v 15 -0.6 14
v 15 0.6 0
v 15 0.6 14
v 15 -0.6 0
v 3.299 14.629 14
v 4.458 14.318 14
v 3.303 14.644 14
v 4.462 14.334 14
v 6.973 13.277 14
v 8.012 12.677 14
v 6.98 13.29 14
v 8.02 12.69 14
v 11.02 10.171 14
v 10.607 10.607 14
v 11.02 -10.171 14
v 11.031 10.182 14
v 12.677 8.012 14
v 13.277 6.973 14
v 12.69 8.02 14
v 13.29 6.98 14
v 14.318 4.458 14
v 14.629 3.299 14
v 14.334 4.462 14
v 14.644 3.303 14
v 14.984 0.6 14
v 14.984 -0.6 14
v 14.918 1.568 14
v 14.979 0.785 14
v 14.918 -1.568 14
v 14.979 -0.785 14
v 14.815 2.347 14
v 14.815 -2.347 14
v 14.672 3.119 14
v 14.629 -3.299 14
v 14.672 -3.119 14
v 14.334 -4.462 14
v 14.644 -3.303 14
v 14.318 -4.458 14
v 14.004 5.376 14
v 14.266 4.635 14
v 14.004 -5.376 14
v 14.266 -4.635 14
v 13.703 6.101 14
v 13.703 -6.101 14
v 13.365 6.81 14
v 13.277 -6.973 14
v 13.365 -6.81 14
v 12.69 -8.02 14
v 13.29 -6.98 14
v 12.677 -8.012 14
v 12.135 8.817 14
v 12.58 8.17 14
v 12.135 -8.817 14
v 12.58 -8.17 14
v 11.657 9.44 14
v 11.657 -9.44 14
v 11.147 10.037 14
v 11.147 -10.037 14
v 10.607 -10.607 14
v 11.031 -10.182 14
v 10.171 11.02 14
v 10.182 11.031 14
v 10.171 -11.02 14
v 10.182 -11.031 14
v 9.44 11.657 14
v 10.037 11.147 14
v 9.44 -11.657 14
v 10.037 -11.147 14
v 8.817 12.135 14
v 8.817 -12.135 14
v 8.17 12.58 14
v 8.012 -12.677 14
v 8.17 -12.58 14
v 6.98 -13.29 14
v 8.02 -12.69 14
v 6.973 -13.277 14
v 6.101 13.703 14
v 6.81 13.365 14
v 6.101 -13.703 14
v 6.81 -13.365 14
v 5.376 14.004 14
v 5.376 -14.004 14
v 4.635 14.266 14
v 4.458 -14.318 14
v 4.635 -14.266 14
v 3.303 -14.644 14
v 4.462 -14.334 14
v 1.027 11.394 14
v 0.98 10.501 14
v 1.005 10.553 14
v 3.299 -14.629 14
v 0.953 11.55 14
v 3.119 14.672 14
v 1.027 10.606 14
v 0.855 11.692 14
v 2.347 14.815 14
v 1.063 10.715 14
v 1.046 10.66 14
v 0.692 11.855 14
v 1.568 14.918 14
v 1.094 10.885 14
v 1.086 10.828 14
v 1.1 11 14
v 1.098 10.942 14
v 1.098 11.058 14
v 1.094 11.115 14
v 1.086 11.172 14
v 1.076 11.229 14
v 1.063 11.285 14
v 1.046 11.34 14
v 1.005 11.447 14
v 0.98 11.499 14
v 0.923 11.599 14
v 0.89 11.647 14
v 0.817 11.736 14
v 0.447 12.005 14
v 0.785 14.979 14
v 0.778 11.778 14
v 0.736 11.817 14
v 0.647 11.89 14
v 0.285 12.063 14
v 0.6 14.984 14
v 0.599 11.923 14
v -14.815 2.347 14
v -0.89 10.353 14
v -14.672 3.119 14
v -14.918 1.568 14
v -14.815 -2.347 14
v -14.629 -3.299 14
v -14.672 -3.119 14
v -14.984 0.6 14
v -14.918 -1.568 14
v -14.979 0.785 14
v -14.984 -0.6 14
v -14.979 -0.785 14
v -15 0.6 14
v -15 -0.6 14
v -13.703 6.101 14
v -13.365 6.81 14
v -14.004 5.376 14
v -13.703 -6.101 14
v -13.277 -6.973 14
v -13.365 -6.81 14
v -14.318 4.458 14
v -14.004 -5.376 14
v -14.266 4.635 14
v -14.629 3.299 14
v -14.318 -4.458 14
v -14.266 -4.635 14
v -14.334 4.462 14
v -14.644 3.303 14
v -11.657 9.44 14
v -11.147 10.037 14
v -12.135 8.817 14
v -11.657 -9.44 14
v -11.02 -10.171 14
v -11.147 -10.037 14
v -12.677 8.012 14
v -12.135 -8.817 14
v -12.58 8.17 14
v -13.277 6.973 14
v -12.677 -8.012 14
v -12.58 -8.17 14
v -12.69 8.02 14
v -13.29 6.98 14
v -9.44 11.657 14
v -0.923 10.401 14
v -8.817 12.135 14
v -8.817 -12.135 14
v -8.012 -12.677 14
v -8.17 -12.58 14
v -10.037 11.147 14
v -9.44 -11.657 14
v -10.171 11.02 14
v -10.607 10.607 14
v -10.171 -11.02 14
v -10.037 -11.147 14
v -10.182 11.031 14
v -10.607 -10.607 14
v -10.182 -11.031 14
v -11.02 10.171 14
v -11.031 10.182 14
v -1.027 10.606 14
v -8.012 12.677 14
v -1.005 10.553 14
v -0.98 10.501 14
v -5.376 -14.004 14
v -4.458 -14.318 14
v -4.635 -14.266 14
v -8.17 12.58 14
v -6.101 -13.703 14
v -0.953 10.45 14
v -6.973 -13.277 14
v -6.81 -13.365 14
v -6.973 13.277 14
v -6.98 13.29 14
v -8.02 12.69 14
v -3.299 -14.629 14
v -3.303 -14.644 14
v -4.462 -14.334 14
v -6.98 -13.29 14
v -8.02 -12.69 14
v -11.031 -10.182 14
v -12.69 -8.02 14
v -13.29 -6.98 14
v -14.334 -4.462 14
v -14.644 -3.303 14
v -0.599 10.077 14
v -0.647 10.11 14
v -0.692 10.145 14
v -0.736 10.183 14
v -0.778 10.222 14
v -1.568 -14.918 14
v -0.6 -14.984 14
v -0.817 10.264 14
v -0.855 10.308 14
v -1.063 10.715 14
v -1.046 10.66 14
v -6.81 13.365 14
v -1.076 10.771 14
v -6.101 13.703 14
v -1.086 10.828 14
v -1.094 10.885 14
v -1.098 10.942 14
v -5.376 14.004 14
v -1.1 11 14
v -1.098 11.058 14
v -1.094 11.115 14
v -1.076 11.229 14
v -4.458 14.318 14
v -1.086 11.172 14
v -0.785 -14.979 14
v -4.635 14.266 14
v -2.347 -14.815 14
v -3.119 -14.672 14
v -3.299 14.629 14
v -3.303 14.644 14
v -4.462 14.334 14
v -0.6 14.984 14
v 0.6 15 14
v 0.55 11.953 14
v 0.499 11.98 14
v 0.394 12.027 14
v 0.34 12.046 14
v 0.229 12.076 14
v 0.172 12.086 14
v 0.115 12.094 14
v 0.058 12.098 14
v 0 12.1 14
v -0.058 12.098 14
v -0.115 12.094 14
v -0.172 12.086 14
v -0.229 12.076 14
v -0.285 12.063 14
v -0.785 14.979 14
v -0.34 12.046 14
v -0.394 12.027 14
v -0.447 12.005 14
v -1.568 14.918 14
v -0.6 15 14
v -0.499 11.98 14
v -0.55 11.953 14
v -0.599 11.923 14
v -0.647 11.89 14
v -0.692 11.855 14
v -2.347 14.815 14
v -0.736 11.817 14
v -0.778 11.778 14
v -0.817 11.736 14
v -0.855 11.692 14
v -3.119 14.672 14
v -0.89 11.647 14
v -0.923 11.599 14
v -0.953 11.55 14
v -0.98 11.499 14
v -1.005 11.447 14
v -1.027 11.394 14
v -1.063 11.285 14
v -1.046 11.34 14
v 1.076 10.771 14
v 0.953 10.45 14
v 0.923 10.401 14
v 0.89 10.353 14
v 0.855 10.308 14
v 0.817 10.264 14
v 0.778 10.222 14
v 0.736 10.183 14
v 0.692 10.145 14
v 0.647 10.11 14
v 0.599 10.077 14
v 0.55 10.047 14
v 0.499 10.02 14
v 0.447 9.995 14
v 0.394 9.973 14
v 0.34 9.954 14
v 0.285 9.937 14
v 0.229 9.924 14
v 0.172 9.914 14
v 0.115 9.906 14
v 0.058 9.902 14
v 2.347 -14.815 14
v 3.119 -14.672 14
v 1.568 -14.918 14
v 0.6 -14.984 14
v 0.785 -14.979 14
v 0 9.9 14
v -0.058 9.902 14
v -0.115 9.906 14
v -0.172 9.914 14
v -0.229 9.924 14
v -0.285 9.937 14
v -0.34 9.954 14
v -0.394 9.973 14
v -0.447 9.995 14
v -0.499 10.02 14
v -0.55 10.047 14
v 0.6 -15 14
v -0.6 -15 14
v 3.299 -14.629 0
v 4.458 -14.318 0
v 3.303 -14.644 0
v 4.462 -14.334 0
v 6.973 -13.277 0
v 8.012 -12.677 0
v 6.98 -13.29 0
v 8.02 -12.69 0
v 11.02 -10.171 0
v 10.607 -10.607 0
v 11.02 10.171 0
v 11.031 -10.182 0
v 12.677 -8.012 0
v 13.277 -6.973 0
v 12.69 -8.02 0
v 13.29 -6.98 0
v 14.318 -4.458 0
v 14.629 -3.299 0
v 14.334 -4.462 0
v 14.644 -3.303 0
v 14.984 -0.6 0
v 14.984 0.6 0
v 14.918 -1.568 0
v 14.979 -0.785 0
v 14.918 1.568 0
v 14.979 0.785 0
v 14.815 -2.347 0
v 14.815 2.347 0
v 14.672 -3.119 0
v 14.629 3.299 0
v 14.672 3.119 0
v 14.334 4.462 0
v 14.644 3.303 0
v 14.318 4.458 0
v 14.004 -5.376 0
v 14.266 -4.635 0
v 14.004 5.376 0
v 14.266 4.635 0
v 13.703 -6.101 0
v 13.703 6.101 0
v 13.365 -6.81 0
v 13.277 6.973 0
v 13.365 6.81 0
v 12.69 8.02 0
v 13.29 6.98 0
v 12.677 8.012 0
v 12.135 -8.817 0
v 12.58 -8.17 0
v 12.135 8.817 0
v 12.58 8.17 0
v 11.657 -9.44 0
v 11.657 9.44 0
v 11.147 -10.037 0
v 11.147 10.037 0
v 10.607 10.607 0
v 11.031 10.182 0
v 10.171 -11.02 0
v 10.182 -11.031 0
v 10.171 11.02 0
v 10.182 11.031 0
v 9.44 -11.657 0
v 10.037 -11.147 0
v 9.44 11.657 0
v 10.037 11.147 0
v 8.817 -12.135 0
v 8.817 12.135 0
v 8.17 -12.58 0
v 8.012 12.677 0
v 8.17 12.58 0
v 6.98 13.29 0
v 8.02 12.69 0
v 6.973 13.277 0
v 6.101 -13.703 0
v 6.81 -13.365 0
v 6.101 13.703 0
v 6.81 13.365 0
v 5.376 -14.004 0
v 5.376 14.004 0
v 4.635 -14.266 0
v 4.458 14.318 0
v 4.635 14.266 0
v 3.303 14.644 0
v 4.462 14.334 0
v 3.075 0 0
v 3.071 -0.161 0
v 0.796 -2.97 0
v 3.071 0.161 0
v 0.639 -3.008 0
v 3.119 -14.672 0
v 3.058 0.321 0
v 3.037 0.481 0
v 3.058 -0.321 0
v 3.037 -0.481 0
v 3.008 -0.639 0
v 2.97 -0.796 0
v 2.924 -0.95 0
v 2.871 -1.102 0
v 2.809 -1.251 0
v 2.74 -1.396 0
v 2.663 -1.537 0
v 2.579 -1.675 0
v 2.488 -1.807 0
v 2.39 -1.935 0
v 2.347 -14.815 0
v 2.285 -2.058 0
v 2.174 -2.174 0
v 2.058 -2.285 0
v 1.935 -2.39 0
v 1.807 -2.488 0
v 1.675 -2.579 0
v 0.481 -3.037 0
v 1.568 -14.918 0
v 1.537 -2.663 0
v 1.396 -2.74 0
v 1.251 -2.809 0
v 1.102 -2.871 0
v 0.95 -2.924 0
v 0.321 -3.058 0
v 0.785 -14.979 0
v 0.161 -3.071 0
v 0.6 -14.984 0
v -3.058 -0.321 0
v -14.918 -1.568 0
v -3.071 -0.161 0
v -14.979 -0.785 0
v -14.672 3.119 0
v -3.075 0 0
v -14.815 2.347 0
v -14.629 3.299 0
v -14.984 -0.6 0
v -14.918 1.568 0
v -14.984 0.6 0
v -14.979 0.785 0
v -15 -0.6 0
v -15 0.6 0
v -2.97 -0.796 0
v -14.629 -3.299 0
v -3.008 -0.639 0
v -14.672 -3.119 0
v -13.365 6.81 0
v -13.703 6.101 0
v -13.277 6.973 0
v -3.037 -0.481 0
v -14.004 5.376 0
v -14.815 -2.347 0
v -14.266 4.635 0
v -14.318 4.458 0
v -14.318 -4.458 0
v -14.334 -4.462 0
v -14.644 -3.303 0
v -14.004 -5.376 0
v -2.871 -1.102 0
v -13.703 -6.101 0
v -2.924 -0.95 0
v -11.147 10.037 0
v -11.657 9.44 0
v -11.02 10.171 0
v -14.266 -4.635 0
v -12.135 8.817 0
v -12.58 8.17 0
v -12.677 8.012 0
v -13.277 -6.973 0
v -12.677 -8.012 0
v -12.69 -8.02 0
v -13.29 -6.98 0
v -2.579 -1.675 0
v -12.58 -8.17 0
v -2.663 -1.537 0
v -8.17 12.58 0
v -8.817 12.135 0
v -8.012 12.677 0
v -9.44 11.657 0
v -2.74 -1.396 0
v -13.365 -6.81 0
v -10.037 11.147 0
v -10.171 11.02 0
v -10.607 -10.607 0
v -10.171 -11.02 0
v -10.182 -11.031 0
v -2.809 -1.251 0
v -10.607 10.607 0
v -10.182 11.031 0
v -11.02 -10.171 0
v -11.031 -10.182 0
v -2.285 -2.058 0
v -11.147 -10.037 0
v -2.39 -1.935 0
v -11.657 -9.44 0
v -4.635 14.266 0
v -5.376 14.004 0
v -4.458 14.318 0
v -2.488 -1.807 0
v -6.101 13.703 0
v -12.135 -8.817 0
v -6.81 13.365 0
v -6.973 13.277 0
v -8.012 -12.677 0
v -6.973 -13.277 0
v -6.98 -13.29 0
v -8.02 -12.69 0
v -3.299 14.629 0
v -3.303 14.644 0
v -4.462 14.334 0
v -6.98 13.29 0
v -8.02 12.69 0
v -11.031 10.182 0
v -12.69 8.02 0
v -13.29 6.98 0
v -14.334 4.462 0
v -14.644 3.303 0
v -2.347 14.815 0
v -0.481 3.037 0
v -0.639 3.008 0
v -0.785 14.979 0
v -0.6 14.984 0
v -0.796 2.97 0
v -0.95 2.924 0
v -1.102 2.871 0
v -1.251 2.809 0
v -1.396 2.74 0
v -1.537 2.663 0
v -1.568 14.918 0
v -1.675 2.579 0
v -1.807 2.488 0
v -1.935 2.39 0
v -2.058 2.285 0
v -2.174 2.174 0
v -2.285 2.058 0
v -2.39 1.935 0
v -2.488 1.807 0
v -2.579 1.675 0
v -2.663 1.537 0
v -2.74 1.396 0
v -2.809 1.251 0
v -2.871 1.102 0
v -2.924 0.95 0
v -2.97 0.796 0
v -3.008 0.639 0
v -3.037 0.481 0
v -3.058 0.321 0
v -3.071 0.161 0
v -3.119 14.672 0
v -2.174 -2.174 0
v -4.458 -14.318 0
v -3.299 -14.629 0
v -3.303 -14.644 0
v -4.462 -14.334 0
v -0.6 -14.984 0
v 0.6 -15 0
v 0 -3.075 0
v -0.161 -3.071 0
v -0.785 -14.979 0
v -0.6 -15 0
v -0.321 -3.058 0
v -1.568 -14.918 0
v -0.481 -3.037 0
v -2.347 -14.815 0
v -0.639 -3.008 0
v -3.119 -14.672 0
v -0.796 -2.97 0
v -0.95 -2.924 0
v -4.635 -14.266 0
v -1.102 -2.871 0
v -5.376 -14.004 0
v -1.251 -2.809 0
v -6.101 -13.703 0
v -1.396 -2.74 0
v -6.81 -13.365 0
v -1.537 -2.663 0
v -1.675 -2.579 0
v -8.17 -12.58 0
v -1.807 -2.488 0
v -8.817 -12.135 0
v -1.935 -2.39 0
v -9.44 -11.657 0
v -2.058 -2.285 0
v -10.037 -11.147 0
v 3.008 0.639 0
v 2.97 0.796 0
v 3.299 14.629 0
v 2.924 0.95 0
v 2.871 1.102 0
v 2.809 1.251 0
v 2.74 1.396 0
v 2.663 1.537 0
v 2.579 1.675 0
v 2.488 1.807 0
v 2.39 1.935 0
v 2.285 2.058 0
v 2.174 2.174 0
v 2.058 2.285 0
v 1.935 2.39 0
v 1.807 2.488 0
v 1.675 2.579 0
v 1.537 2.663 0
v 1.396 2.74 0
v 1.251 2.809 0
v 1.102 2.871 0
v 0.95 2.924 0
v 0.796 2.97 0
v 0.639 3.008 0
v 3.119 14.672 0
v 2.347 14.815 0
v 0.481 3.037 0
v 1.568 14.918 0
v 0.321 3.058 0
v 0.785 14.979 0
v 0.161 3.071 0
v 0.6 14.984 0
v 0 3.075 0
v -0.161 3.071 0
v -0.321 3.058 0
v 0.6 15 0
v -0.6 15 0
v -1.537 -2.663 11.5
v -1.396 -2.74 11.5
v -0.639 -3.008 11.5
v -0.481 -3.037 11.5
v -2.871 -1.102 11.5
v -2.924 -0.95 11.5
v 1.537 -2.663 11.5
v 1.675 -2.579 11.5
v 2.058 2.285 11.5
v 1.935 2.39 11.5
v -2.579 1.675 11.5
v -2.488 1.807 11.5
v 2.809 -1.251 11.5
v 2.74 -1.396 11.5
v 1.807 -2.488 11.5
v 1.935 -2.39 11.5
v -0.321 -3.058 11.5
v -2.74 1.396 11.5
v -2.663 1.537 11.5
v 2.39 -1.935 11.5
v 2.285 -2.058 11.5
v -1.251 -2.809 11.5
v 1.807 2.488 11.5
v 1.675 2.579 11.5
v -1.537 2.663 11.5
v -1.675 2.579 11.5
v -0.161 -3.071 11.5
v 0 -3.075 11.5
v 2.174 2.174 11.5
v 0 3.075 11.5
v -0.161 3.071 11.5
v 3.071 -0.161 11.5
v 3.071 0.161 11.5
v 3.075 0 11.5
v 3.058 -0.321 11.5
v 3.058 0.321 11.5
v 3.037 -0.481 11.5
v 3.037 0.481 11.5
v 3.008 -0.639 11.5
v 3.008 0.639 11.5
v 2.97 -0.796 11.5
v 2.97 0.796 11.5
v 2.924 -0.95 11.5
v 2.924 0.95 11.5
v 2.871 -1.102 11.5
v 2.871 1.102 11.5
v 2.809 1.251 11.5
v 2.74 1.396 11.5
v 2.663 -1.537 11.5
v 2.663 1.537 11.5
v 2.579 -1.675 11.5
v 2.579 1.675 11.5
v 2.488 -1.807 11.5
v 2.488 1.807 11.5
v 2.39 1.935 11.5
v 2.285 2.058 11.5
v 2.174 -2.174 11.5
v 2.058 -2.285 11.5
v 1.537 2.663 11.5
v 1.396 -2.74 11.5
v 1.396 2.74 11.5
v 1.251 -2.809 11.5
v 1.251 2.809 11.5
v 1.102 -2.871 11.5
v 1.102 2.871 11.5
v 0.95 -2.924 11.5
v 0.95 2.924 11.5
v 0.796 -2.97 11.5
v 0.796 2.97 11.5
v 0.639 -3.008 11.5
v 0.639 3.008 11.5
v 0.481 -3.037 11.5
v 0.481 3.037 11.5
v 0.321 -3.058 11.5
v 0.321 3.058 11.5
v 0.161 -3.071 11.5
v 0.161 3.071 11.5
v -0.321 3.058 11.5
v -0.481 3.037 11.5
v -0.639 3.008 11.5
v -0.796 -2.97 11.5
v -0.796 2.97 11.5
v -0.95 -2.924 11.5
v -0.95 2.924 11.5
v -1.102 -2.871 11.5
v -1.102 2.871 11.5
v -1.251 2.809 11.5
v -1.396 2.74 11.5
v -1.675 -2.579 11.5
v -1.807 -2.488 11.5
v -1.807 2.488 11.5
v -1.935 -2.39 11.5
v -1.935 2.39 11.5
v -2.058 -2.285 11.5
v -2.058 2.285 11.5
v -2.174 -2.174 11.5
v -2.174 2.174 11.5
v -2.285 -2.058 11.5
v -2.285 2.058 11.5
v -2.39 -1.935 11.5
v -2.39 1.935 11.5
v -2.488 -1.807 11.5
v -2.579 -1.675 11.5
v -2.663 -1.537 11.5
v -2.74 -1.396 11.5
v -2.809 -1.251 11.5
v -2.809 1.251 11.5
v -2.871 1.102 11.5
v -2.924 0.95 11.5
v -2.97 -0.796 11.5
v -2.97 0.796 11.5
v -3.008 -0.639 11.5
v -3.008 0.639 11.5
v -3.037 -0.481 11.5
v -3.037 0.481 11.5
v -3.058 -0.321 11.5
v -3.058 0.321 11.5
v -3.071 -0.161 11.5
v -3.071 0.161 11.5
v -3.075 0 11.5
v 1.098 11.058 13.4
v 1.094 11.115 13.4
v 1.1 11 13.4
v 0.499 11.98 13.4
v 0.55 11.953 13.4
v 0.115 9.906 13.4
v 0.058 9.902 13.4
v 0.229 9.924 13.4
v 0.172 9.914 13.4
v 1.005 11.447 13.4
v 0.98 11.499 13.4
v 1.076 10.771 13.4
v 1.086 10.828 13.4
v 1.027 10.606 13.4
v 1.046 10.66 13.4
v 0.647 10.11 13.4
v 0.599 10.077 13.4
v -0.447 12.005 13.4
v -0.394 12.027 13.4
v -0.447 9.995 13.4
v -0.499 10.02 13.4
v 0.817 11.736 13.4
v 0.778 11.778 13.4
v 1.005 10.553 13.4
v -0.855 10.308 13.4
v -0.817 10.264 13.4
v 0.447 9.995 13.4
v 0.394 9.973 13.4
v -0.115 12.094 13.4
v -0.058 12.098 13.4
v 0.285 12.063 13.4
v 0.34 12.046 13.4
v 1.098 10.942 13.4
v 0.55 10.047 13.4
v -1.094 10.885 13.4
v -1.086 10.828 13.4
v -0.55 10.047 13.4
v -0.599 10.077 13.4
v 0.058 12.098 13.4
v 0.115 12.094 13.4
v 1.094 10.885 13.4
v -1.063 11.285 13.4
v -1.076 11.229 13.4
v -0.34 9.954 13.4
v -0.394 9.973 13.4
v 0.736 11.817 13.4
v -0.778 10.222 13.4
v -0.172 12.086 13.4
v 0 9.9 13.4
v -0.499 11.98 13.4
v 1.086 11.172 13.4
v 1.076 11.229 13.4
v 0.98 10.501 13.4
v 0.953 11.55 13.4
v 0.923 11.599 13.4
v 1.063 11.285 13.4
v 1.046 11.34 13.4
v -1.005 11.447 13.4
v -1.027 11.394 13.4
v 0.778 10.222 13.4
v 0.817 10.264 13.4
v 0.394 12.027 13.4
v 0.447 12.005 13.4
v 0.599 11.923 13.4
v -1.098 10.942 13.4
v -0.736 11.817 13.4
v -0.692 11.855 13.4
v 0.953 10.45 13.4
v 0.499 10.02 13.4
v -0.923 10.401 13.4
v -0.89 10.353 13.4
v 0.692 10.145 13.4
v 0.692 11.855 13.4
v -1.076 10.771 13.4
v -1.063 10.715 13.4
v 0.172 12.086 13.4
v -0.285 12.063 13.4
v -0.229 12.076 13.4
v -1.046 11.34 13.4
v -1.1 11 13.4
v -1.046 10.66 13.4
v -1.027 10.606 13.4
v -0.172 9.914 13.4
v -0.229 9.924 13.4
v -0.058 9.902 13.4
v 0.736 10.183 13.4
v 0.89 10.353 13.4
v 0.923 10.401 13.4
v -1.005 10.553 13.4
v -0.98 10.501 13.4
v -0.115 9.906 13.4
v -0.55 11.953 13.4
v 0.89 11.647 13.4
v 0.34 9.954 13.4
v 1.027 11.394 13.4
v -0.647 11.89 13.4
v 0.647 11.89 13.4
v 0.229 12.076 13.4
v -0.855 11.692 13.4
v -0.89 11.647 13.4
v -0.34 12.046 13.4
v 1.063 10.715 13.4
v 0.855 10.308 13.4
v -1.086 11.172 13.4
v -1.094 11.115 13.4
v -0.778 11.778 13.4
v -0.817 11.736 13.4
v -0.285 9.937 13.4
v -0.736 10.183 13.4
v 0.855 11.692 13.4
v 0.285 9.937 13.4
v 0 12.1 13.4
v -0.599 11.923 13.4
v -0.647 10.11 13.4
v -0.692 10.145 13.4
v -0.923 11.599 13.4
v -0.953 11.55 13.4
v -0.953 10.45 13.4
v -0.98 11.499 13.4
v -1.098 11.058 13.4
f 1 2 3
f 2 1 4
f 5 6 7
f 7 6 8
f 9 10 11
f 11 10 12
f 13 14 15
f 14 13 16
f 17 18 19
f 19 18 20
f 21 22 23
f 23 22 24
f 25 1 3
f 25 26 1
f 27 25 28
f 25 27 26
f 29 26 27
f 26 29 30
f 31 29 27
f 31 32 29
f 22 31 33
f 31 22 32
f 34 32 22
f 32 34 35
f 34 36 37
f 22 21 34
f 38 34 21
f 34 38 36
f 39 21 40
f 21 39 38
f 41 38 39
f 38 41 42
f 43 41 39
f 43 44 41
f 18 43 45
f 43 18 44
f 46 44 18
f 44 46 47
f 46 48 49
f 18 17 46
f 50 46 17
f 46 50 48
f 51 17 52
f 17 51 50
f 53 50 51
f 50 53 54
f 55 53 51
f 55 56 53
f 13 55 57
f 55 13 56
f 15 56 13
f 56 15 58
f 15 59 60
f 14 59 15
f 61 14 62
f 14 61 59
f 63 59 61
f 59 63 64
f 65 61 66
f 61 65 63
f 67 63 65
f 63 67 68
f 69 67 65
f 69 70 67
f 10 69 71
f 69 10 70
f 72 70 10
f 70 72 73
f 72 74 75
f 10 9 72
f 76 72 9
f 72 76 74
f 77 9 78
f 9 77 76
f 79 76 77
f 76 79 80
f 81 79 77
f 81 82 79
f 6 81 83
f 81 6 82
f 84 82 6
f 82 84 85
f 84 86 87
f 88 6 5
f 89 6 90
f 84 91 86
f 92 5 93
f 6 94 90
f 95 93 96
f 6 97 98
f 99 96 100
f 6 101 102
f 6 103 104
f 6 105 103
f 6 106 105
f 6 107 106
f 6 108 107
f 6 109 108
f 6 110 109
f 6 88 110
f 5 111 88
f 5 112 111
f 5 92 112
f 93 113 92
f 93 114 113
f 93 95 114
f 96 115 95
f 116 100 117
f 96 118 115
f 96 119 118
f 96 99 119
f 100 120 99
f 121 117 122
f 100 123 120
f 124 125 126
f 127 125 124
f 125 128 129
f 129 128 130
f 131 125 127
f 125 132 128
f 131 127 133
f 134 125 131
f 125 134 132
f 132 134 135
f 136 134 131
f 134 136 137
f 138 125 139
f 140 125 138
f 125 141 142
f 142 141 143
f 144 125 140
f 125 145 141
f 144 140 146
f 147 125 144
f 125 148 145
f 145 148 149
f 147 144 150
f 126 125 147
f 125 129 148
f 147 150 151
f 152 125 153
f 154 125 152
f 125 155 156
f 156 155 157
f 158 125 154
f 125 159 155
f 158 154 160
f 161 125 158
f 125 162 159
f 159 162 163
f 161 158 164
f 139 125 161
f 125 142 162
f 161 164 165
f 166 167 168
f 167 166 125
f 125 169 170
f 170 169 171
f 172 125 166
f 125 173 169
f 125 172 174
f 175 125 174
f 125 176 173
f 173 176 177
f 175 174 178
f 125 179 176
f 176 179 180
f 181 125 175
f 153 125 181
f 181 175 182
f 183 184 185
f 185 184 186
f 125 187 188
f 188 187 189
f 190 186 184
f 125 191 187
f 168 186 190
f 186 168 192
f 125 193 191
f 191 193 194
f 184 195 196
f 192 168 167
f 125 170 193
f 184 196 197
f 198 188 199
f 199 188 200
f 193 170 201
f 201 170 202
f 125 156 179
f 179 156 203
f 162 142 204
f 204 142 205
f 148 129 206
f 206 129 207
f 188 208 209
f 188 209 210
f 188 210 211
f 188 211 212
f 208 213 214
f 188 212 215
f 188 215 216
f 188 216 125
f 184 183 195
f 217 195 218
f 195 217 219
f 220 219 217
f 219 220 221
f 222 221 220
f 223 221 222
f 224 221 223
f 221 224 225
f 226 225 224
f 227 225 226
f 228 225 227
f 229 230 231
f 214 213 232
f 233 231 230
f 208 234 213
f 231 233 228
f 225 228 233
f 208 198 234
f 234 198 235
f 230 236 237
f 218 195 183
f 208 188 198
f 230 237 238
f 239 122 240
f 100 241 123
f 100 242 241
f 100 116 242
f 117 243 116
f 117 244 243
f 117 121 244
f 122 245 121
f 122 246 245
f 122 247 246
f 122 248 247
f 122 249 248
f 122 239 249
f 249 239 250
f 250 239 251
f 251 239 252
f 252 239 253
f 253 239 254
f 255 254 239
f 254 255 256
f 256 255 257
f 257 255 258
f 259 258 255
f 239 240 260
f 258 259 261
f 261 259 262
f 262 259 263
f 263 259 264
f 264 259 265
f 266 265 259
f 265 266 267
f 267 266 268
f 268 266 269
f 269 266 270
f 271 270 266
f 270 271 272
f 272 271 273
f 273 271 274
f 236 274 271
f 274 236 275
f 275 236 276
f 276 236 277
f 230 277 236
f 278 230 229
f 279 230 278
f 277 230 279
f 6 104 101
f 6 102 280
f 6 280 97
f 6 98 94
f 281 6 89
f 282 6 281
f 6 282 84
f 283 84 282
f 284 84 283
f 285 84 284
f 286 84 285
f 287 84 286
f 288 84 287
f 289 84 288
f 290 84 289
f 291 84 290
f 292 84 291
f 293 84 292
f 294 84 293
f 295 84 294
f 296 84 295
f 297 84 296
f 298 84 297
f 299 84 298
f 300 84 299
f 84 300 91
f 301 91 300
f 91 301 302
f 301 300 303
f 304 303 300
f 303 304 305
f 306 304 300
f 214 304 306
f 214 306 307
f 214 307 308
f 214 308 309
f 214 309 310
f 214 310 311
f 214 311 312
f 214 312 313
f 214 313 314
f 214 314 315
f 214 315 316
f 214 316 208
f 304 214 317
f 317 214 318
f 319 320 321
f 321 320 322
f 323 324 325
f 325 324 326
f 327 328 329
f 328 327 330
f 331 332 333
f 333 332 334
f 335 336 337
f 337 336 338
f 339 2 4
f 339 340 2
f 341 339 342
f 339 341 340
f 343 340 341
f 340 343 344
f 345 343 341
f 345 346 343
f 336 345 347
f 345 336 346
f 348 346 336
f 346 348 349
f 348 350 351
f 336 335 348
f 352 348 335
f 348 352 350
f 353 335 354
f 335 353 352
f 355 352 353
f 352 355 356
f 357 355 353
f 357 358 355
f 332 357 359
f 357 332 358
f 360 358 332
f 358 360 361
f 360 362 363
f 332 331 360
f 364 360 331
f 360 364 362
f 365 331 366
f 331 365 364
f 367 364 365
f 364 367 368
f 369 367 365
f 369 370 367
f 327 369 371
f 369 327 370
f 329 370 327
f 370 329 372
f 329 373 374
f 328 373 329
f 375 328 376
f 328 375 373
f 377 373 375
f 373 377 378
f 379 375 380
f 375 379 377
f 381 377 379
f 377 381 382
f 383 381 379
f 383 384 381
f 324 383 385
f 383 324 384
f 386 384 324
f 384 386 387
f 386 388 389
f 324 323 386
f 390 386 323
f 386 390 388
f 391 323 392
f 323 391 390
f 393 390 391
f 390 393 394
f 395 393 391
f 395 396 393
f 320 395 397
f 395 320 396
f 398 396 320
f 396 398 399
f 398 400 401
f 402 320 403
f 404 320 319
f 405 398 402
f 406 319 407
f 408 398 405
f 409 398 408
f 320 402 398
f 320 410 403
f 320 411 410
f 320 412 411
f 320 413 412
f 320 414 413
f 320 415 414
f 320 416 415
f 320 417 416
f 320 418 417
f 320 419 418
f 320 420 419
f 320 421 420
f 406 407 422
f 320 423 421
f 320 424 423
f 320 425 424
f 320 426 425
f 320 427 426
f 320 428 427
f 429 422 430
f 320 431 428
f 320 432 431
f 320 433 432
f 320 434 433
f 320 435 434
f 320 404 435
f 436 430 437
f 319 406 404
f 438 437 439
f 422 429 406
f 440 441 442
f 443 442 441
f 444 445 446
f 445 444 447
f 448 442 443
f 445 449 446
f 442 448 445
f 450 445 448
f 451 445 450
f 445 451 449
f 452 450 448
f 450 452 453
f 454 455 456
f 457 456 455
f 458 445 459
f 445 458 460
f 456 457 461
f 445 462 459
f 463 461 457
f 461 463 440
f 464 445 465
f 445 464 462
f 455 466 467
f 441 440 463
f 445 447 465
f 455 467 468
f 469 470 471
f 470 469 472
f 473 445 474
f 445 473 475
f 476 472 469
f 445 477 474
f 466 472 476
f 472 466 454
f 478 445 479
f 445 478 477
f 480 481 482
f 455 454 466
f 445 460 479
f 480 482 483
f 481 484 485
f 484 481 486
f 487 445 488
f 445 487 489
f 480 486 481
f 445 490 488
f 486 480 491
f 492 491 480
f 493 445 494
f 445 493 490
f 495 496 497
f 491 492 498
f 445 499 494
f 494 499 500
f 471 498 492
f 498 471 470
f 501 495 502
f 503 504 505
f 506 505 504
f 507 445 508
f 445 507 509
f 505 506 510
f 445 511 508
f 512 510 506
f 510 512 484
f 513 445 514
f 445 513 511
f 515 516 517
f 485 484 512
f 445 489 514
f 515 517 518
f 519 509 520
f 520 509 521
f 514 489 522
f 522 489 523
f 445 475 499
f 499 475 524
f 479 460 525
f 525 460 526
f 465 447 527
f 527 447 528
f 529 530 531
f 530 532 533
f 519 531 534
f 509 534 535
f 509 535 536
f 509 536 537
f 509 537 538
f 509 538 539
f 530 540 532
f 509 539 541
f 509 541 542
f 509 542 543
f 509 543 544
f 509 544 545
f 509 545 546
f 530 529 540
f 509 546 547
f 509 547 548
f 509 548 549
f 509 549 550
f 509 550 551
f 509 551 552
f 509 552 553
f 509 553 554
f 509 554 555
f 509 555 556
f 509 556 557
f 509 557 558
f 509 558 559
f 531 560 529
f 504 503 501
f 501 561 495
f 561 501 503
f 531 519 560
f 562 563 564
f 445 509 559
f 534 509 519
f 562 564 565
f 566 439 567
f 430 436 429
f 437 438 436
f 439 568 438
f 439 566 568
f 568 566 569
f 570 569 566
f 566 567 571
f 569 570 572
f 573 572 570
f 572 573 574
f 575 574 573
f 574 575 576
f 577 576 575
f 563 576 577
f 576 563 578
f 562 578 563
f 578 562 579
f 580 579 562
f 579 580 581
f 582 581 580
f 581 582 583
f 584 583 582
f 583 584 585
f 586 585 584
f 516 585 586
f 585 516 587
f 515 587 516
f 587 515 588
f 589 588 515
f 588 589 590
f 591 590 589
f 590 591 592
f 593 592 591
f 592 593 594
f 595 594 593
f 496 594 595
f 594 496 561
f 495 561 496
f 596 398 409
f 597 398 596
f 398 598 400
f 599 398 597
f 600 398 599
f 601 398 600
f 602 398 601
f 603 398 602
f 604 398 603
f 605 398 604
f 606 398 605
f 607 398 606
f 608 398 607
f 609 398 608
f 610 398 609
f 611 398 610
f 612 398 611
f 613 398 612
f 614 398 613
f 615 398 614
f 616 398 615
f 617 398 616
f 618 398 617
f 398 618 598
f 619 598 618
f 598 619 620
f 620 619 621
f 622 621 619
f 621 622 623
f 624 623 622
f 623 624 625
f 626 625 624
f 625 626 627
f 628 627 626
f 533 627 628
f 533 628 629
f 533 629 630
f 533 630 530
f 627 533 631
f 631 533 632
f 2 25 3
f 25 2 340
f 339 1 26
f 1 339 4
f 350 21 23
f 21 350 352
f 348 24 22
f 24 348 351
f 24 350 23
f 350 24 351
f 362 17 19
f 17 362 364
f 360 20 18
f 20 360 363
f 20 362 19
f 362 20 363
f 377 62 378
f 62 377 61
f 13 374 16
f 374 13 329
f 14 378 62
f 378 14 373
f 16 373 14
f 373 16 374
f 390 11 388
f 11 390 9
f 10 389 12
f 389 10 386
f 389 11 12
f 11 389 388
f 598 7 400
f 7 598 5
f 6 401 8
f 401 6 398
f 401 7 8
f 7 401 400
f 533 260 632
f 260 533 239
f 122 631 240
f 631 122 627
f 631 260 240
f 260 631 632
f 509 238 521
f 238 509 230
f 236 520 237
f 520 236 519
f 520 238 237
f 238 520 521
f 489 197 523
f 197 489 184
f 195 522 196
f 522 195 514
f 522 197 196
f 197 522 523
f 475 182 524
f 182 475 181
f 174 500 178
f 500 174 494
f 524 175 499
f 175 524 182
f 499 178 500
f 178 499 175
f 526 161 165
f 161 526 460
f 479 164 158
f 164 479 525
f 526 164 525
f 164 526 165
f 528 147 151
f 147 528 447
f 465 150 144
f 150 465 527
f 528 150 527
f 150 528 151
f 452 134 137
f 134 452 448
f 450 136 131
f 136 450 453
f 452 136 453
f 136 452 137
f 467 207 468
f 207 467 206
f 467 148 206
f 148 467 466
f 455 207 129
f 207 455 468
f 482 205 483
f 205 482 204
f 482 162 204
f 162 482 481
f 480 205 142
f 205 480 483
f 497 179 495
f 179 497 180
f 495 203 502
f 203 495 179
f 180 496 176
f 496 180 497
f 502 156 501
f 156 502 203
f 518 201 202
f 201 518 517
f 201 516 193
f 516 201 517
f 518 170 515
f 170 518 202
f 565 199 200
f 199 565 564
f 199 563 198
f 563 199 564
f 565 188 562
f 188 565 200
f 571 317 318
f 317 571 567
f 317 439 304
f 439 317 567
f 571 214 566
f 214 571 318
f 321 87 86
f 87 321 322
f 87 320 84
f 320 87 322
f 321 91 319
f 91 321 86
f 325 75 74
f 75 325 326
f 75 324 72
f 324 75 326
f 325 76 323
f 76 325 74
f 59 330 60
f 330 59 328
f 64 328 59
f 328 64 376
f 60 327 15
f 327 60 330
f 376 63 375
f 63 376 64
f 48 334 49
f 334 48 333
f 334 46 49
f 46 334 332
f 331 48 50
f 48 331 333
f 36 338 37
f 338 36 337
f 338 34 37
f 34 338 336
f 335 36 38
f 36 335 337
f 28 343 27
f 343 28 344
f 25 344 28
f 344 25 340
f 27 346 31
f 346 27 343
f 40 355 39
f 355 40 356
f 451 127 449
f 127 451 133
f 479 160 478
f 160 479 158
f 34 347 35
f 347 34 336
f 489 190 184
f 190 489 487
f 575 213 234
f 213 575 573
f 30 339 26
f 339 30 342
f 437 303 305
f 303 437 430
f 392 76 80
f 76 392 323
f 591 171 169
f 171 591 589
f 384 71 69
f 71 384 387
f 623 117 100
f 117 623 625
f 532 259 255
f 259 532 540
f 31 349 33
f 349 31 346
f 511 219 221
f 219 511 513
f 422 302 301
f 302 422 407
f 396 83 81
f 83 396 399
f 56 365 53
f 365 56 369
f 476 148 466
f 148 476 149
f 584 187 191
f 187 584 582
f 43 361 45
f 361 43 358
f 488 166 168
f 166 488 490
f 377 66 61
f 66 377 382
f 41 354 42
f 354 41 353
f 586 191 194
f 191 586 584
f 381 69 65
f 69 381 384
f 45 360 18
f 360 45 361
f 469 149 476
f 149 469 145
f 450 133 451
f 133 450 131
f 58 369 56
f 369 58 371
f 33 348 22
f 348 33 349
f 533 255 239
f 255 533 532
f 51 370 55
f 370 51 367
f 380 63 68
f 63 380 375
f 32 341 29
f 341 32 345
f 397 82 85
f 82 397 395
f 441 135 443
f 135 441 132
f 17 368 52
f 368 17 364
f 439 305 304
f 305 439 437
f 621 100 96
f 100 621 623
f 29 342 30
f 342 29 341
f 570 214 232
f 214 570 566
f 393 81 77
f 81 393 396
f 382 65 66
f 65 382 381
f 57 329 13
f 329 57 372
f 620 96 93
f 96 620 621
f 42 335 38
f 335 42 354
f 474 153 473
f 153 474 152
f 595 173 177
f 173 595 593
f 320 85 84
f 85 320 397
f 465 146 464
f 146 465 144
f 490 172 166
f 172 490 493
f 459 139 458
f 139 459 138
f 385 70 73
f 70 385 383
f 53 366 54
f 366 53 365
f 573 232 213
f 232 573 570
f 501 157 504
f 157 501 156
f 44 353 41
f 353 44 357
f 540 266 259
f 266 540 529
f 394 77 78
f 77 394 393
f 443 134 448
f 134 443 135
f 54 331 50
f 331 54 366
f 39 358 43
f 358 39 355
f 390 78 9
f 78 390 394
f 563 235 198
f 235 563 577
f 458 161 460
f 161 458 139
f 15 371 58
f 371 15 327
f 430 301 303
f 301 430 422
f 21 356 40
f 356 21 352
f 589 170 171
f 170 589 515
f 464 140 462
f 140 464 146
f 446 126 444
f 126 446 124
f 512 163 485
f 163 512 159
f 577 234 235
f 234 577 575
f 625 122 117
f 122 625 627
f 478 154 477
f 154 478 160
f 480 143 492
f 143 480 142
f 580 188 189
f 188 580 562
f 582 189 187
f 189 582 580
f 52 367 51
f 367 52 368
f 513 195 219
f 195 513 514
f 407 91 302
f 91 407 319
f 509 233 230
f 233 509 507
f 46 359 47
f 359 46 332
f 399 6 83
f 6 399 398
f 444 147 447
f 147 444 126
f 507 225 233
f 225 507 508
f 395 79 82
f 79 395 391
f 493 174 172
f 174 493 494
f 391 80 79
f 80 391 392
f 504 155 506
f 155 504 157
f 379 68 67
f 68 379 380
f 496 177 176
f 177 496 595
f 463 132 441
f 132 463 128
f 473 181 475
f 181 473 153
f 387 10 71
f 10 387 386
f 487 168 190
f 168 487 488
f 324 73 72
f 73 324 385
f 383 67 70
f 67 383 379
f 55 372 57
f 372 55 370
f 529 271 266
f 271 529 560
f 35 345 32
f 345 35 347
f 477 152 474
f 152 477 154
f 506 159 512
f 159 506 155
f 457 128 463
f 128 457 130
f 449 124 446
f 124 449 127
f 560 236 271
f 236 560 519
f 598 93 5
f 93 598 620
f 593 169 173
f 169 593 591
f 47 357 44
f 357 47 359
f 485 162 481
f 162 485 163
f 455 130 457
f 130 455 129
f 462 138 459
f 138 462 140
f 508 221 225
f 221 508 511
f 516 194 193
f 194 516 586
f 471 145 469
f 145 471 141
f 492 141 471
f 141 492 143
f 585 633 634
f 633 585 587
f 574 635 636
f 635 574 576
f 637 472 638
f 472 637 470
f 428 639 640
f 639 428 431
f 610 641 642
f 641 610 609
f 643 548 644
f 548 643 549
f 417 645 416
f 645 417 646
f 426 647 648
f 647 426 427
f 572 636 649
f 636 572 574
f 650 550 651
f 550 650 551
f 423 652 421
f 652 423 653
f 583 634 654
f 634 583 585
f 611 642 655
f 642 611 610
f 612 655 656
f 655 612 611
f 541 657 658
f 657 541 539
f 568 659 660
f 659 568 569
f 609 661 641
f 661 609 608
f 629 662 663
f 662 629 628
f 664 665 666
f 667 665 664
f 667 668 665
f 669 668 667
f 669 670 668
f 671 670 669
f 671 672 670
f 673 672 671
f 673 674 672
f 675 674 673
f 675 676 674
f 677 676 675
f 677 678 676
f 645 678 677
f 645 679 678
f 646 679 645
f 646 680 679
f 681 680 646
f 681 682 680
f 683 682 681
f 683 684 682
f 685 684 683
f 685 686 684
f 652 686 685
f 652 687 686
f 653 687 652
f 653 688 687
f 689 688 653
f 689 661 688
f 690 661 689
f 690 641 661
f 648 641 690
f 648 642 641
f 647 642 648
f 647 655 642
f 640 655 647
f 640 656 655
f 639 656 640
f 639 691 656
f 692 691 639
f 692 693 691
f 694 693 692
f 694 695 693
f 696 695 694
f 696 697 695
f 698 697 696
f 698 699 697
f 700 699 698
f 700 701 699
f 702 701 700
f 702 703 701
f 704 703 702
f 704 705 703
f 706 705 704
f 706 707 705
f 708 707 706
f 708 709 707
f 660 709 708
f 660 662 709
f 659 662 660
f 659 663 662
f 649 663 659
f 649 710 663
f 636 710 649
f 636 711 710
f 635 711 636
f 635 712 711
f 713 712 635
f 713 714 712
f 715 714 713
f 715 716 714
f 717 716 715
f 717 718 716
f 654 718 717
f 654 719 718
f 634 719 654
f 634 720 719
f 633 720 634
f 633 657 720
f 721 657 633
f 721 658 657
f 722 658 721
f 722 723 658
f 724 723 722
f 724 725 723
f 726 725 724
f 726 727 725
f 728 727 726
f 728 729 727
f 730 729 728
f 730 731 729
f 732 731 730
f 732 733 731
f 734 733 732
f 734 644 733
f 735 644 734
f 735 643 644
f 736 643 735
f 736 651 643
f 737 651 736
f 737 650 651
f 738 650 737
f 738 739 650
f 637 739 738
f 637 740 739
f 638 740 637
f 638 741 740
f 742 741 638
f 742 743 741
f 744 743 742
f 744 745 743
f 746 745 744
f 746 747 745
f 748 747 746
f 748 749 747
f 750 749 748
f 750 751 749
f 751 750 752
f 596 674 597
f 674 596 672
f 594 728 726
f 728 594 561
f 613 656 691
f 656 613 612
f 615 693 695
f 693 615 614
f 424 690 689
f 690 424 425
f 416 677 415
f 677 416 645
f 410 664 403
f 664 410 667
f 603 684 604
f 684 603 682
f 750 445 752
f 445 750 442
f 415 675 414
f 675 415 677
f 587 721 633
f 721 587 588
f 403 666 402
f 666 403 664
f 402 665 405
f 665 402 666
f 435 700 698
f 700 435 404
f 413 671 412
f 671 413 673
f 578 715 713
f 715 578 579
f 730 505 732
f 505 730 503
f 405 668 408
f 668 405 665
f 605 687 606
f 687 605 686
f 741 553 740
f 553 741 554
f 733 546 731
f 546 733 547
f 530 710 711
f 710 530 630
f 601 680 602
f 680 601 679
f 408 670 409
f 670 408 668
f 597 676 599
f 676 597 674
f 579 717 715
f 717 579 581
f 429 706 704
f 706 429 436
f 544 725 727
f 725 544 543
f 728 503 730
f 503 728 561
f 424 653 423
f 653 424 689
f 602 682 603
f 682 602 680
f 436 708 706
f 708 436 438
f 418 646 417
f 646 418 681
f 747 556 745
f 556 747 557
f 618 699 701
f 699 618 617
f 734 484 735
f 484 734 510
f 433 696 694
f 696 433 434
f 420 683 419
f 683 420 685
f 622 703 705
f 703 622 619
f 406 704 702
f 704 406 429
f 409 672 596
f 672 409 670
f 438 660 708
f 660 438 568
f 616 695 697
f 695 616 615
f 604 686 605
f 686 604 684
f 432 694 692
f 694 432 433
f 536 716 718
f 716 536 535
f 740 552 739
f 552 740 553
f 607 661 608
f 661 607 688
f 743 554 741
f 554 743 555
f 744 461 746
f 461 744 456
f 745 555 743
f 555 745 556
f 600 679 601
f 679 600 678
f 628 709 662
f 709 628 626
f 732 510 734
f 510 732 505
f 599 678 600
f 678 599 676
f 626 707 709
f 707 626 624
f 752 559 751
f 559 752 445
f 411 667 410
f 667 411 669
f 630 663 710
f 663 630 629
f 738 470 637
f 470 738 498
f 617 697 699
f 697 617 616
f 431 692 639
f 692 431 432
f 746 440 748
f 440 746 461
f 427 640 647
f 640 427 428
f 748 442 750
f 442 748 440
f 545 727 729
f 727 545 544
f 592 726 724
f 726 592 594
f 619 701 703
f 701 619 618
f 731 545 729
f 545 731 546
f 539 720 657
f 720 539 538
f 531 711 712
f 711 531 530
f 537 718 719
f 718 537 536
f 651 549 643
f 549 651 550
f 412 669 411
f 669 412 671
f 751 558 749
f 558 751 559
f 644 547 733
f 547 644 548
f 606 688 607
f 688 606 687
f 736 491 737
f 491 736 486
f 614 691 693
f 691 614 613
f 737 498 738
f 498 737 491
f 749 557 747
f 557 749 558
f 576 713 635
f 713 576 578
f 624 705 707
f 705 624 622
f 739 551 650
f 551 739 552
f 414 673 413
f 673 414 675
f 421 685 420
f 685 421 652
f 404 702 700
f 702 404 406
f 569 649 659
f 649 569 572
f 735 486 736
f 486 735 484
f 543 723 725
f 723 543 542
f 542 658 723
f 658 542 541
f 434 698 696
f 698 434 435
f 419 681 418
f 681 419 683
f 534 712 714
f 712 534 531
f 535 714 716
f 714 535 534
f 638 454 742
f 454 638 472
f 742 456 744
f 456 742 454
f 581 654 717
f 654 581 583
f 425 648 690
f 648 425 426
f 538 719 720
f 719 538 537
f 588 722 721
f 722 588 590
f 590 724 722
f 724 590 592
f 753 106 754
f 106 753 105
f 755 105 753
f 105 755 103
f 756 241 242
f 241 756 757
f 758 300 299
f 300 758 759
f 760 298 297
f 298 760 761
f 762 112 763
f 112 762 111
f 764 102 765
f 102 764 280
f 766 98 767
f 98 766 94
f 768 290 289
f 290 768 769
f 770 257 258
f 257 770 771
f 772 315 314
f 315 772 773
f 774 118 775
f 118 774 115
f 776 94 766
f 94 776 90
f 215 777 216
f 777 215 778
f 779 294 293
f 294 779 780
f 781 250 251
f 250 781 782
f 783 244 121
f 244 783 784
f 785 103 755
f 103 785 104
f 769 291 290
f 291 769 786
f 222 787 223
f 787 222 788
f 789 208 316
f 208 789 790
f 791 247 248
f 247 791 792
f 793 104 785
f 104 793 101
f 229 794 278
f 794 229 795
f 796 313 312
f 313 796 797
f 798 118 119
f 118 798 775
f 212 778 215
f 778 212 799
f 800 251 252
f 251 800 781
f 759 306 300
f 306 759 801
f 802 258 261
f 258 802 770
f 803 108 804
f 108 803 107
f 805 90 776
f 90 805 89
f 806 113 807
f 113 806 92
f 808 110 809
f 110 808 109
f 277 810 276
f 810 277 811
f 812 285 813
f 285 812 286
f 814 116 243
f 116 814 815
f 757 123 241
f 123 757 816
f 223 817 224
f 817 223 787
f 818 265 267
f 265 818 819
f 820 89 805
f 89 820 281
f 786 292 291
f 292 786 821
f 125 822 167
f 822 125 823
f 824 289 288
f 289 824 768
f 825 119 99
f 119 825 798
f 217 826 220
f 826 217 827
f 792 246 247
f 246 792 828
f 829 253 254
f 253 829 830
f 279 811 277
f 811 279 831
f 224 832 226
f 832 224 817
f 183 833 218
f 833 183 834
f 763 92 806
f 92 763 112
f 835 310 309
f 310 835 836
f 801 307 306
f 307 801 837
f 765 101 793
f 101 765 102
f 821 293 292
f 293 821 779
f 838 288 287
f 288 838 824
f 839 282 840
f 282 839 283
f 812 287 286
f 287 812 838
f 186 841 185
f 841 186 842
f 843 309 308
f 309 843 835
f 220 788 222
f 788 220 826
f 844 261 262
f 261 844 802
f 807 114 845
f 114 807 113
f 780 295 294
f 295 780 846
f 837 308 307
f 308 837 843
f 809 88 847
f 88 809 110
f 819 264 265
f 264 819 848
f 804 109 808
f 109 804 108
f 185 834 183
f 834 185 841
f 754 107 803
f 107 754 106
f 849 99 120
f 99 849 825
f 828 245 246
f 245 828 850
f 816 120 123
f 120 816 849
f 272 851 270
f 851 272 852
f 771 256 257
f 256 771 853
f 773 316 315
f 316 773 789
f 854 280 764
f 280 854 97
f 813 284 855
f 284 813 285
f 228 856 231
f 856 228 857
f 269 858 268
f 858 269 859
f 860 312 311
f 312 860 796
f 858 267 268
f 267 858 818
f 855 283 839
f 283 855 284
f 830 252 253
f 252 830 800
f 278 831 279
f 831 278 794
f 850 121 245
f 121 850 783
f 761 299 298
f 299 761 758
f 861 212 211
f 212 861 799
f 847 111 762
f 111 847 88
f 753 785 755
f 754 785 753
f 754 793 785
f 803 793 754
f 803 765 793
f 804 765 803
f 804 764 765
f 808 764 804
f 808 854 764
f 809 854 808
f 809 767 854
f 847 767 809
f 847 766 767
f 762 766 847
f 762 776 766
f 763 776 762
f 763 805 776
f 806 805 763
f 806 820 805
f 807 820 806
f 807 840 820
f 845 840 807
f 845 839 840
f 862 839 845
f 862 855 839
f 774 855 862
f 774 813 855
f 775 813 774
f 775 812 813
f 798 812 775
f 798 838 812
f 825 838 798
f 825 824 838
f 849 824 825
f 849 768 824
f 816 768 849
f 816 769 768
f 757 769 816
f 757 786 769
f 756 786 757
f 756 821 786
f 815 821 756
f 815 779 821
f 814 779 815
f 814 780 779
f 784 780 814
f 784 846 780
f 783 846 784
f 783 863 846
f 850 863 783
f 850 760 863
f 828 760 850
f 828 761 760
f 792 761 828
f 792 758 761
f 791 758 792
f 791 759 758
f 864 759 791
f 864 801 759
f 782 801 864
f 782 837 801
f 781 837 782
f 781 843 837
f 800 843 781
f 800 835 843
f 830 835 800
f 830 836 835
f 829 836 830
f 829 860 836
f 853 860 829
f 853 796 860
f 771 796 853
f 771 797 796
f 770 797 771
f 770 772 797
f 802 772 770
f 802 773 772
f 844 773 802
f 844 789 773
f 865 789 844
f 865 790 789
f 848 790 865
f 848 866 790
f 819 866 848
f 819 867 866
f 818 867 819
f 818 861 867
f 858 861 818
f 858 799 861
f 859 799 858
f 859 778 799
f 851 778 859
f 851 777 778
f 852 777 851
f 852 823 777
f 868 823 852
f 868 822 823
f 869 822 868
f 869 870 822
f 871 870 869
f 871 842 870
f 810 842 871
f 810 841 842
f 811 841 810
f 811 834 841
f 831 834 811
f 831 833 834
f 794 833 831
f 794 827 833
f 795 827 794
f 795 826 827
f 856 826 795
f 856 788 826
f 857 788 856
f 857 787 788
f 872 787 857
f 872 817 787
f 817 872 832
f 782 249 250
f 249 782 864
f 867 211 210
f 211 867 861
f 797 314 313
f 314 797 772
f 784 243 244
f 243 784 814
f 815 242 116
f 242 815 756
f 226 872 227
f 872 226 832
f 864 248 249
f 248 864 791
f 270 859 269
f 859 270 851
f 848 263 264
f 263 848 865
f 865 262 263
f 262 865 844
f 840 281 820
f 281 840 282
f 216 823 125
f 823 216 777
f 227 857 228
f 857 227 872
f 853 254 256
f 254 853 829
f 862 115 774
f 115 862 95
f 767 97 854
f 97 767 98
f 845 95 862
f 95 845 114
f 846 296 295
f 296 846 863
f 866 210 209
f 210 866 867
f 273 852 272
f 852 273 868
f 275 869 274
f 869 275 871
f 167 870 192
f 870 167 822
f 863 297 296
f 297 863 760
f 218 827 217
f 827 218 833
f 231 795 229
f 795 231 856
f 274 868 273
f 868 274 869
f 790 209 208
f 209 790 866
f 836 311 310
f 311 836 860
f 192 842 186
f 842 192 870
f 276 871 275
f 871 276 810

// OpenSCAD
// WallKnob-C6 Rev A - printable knob for common 6 mm D-shaft EC11
$fn=120;
knob_d=30;
knob_h=14;
bore_d=6.15;
shaft_flat=4.5;
bore_depth=11.5;

module d_bore(h){
  intersection(){
    cylinder(d=bore_d,h=h);
    translate([-bore_d,-bore_d,0]) cube([2*bore_d, bore_d+shaft_flat, h]);
  }
}

difference(){
  union(){
    cylinder(d=knob_d,h=knob_h);
    for(a=[0:15:345]) rotate([0,0,a]) translate([knob_d/2-0.4,0,knob_h/2]) cube([0.8,1.2,knob_h],center=true);
  }
  translate([0,0,-0.1]) d_bore(bore_depth+0.1);
  translate([0,knob_d/2-4,knob_h-0.6]) cylinder(d=2.2,h=0.8);
}
